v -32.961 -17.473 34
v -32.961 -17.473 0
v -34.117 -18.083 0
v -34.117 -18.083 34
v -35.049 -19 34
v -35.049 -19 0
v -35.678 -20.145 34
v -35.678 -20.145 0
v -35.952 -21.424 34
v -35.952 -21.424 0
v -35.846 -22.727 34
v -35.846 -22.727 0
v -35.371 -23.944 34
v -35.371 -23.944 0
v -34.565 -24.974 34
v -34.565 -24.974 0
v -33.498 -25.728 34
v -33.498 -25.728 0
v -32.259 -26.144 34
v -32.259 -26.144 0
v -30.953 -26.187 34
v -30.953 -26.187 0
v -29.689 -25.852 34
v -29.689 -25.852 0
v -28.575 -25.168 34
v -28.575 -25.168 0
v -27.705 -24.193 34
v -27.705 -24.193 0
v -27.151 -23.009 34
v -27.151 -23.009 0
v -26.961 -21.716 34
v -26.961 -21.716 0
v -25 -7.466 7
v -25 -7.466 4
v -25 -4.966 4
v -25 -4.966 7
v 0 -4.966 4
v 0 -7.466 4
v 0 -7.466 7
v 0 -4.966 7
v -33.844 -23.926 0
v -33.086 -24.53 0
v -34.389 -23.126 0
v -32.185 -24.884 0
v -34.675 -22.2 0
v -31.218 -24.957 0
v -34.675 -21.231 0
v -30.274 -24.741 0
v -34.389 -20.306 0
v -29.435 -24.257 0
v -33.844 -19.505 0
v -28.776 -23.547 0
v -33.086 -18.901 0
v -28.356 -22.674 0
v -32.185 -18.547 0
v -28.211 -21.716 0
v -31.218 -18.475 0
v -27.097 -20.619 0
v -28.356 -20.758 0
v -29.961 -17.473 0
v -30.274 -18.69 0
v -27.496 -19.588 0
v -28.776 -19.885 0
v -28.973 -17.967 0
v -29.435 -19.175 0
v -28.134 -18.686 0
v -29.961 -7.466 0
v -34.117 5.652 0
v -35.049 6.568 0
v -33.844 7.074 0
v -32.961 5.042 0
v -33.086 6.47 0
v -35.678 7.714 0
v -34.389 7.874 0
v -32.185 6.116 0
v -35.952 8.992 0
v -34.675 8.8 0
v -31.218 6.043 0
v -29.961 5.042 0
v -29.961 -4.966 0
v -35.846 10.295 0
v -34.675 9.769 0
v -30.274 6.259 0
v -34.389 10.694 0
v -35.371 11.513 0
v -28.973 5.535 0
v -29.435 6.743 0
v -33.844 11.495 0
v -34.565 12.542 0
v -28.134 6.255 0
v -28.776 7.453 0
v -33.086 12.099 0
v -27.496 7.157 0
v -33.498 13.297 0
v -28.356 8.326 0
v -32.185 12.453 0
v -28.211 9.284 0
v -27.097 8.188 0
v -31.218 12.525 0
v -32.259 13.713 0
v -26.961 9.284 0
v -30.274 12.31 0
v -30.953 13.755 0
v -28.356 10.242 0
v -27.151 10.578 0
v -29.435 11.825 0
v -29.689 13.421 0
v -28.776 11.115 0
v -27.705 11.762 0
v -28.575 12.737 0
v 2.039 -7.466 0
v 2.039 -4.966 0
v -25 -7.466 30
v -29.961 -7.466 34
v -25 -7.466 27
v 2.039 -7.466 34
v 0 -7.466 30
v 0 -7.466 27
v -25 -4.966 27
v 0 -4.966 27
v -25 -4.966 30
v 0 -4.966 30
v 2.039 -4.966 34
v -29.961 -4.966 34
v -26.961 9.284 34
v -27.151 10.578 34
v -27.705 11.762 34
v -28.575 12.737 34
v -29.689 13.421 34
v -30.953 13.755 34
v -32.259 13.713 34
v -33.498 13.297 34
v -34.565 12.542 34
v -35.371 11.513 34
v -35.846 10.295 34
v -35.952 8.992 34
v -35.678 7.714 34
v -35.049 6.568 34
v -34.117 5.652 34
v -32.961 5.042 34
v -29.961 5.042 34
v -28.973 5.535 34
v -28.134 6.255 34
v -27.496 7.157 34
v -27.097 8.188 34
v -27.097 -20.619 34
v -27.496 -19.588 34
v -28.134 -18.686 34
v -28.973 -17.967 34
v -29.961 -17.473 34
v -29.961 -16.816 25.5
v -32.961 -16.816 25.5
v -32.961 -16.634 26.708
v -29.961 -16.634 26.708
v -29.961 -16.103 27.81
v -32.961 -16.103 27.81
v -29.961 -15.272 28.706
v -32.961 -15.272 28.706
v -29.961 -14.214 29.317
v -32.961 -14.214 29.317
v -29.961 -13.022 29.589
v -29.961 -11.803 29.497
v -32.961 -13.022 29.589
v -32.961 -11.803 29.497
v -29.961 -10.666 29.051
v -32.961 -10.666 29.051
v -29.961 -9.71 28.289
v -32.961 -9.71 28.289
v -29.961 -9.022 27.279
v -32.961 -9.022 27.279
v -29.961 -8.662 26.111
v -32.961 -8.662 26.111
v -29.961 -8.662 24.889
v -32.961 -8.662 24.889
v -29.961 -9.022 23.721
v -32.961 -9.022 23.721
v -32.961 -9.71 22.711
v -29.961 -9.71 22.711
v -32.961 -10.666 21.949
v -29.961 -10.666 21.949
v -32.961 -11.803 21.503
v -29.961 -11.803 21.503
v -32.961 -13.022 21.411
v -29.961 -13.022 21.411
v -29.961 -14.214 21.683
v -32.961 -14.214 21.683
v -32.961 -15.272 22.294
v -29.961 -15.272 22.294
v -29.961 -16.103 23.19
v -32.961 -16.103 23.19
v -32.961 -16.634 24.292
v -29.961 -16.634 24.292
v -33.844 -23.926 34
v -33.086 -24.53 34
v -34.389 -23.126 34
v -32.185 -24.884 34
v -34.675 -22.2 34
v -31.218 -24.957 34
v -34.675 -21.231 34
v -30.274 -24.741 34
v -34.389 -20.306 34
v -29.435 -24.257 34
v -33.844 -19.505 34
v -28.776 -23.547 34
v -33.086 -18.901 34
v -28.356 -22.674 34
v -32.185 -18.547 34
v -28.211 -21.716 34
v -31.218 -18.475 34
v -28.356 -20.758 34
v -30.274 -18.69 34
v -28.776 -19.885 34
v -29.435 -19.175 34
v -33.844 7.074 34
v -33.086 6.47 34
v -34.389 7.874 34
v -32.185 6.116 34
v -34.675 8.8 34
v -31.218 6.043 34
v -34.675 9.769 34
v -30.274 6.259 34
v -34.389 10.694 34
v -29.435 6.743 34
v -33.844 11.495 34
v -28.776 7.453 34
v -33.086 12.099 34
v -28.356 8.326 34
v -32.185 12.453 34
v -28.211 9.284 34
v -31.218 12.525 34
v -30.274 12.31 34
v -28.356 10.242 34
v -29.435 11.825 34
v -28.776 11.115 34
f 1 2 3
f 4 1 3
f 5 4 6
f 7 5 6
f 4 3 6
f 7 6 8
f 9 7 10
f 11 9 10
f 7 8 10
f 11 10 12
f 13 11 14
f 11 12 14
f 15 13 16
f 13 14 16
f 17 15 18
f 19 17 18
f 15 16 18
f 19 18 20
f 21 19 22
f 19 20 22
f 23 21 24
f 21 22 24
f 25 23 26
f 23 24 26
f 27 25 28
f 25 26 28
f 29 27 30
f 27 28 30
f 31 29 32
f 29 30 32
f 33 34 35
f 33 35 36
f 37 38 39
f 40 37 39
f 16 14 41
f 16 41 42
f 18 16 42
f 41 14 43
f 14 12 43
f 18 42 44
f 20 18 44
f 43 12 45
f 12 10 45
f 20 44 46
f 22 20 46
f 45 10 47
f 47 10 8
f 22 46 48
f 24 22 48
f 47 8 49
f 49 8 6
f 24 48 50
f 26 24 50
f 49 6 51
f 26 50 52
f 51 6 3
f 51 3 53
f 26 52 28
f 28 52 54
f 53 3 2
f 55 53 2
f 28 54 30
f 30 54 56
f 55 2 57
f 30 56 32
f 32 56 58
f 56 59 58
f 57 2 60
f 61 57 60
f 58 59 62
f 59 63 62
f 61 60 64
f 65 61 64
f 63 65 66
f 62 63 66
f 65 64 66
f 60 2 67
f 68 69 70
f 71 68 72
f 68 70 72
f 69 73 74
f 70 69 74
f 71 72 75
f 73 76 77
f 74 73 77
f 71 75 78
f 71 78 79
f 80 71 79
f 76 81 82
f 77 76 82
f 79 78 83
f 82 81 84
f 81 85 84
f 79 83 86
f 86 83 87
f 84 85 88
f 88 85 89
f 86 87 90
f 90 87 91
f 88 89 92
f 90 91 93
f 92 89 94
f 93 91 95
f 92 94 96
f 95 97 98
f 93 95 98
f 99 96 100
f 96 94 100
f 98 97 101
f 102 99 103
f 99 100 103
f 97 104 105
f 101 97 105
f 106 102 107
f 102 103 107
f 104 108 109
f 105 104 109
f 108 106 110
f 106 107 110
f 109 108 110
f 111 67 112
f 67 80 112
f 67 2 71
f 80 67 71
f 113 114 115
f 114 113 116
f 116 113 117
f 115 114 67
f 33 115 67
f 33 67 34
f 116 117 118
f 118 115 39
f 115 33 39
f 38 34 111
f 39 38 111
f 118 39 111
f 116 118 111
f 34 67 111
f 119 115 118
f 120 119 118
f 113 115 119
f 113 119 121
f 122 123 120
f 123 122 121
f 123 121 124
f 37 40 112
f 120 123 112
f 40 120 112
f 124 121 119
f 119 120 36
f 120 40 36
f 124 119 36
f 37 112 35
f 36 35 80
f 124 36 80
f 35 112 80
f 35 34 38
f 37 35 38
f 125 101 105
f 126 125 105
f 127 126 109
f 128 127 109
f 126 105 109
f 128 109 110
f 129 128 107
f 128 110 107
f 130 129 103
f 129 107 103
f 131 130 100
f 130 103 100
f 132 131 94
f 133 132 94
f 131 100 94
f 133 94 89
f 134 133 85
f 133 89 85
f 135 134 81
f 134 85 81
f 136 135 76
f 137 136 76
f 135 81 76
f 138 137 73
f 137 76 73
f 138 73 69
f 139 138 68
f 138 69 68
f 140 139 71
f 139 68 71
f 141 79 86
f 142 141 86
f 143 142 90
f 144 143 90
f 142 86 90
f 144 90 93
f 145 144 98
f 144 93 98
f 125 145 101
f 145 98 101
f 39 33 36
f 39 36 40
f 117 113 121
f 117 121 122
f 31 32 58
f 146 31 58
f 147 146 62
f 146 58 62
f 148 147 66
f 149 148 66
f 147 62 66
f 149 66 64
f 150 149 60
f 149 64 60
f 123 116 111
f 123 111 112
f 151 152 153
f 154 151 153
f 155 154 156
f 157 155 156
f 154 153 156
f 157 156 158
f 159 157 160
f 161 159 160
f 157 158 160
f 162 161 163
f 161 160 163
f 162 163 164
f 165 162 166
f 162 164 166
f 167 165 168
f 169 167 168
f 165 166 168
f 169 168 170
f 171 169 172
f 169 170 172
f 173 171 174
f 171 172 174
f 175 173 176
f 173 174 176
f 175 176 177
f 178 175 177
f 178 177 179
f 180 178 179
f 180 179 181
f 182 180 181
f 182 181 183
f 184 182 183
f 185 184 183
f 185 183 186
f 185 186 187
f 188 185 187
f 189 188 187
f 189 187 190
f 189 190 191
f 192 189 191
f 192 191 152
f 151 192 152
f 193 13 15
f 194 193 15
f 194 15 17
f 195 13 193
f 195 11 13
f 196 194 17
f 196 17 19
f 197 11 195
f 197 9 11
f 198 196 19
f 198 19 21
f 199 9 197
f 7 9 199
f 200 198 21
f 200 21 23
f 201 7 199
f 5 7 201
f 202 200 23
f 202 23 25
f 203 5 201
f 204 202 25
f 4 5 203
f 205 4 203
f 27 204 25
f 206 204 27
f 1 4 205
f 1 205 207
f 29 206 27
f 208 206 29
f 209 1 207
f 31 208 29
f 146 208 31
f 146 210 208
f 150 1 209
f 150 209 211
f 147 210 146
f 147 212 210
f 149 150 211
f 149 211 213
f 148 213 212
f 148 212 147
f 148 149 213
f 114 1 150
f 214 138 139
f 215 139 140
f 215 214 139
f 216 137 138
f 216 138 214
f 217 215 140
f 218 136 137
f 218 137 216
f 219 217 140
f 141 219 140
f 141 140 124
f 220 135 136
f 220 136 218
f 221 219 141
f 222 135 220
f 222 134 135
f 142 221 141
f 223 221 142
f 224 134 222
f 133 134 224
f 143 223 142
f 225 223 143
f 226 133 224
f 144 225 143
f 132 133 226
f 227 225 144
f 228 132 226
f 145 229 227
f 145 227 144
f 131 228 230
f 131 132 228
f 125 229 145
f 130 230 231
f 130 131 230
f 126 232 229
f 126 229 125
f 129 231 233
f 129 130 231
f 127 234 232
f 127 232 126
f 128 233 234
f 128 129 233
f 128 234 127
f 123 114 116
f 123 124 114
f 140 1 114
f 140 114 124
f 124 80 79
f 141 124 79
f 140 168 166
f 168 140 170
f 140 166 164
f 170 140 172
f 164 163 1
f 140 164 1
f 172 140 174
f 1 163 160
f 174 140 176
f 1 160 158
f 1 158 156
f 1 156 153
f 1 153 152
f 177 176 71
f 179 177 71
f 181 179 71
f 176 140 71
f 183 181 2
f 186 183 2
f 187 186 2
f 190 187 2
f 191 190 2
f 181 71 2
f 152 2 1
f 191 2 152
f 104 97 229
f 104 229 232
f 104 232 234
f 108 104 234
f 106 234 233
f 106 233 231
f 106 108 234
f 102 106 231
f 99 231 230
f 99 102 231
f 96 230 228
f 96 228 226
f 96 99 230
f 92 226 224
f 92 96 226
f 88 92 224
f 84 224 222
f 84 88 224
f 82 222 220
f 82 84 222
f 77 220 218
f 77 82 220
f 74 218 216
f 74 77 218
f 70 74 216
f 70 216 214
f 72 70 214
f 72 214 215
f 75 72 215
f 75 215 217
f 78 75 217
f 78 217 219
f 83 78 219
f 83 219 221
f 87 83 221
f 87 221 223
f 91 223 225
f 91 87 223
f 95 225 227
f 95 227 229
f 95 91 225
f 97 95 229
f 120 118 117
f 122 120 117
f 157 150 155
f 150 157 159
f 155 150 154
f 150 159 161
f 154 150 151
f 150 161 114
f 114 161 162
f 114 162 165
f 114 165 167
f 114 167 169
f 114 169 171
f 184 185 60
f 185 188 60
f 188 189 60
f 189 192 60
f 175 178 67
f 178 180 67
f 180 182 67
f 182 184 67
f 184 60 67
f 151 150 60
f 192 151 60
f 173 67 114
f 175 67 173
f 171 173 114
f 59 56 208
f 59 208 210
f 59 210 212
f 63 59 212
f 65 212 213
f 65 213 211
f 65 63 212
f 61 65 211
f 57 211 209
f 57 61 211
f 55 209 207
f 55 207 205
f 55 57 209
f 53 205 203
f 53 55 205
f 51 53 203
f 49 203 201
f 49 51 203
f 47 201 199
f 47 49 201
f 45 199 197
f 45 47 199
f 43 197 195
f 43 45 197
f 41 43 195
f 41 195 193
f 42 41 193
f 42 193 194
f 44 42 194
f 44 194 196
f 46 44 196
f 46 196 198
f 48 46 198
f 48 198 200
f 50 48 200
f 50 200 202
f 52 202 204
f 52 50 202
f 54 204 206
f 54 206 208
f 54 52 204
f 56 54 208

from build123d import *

# Parameters (mm, degrees)
F0_R     = 3.25
F1_DEPTH = 34
F3_DEPTH = 25
F4_W     = 25
F4_H     = 3
F5_DEPTH = 25


with BuildPart() as f1:
    # F0 (on Top) → F1 (new body)
    with BuildSketch(Plane.XY):
        with BuildLine():
            ThreePointArc((-29.961314, 5.041625), (-27.78708, 6.686189), (-26.961314, 9.284266))
            ThreePointArc((-26.961314, 9.284266), (-34.05939, 12.9585), (-32.961314, 5.041625))
            ThreePointArc((-32.961314, 5.041625), (-31.461314, 4.784266), (-29.961314, 5.041625))
        make_face()
        with Locations((-31.461314, 9.284266)):
            Circle(F0_R, mode=Mode.SUBTRACT)
        with BuildLine():
            ThreePointArc((-29.961314, 5.041625), (-31.461314, 4.784266), (-32.961314, 5.041625))
            Line((-32.961314, 5.041625), (-32.961314, -6.215734))
            Line((-32.961314, -6.215734), (2.038686, -6.215734))
            Line((2.038686, -6.215734), (2.038686, -4.965734))
            Line((2.038686, -4.965734), (-29.961314, -4.965734))
            Line((-29.961314, -4.965734), (-29.961314, 5.041625))
        make_face()
        with BuildLine():
            Line((2.038686, -6.215734), (-32.961314, -6.215734))
            Line((-32.961314, -6.215734), (-32.961314, -17.473094))
            ThreePointArc((-32.961314, -17.473094), (-31.461314, -17.215734), (-29.961314, -17.473094))
            Line((-29.961314, -17.473094), (-29.961314, -7.465734))
            Line((-29.961314, -7.465734), (2.038686, -7.465734))
            Line((2.038686, -7.465734), (2.038686, -6.215734))
        make_face()
        with BuildLine():
            ThreePointArc((-29.961314, -17.473094), (-31.461314, -17.215734), (-32.961314, -17.473094))
            ThreePointArc((-32.961314, -17.473094), (-34.05939, -25.389969), (-26.961314, -21.715734))
            ThreePointArc((-26.961314, -21.715734), (-27.78708, -19.117658), (-29.961314, -17.473094))
        make_face()
        with Locations((-31.461314, -21.715734)):
            Circle(F0_R, mode=Mode.SUBTRACT)
    extrude(amount=F1_DEPTH)

    # F2 (on face) → F3 (cut)
    with BuildSketch(Plane(origin=(-32.961314, 0, 0), x_dir=(0, -1, 0), z_dir=(-1, 0, 0))):
        with BuildLine():
            ThreePointArc((8.615734, 25.5), (12.715734, 21.4), (16.815734, 25.5))
            ThreePointArc((16.815734, 25.5), (12.715734, 29.6), (8.615734, 25.5))
        make_face()
    extrude(amount=-F3_DEPTH, mode=Mode.SUBTRACT)

    # F4 (on face) → F5 (cut)
    with BuildSketch(Plane.XZ.offset(7.465734)):
        with Locations((-12.5, 28.5)):
            Rectangle(F4_W, F4_H)
        with Locations((-12.5, 5.5)):
            Rectangle(F4_W, F4_H)
    extrude(amount=-F5_DEPTH, mode=Mode.SUBTRACT)


solid = f1.part
